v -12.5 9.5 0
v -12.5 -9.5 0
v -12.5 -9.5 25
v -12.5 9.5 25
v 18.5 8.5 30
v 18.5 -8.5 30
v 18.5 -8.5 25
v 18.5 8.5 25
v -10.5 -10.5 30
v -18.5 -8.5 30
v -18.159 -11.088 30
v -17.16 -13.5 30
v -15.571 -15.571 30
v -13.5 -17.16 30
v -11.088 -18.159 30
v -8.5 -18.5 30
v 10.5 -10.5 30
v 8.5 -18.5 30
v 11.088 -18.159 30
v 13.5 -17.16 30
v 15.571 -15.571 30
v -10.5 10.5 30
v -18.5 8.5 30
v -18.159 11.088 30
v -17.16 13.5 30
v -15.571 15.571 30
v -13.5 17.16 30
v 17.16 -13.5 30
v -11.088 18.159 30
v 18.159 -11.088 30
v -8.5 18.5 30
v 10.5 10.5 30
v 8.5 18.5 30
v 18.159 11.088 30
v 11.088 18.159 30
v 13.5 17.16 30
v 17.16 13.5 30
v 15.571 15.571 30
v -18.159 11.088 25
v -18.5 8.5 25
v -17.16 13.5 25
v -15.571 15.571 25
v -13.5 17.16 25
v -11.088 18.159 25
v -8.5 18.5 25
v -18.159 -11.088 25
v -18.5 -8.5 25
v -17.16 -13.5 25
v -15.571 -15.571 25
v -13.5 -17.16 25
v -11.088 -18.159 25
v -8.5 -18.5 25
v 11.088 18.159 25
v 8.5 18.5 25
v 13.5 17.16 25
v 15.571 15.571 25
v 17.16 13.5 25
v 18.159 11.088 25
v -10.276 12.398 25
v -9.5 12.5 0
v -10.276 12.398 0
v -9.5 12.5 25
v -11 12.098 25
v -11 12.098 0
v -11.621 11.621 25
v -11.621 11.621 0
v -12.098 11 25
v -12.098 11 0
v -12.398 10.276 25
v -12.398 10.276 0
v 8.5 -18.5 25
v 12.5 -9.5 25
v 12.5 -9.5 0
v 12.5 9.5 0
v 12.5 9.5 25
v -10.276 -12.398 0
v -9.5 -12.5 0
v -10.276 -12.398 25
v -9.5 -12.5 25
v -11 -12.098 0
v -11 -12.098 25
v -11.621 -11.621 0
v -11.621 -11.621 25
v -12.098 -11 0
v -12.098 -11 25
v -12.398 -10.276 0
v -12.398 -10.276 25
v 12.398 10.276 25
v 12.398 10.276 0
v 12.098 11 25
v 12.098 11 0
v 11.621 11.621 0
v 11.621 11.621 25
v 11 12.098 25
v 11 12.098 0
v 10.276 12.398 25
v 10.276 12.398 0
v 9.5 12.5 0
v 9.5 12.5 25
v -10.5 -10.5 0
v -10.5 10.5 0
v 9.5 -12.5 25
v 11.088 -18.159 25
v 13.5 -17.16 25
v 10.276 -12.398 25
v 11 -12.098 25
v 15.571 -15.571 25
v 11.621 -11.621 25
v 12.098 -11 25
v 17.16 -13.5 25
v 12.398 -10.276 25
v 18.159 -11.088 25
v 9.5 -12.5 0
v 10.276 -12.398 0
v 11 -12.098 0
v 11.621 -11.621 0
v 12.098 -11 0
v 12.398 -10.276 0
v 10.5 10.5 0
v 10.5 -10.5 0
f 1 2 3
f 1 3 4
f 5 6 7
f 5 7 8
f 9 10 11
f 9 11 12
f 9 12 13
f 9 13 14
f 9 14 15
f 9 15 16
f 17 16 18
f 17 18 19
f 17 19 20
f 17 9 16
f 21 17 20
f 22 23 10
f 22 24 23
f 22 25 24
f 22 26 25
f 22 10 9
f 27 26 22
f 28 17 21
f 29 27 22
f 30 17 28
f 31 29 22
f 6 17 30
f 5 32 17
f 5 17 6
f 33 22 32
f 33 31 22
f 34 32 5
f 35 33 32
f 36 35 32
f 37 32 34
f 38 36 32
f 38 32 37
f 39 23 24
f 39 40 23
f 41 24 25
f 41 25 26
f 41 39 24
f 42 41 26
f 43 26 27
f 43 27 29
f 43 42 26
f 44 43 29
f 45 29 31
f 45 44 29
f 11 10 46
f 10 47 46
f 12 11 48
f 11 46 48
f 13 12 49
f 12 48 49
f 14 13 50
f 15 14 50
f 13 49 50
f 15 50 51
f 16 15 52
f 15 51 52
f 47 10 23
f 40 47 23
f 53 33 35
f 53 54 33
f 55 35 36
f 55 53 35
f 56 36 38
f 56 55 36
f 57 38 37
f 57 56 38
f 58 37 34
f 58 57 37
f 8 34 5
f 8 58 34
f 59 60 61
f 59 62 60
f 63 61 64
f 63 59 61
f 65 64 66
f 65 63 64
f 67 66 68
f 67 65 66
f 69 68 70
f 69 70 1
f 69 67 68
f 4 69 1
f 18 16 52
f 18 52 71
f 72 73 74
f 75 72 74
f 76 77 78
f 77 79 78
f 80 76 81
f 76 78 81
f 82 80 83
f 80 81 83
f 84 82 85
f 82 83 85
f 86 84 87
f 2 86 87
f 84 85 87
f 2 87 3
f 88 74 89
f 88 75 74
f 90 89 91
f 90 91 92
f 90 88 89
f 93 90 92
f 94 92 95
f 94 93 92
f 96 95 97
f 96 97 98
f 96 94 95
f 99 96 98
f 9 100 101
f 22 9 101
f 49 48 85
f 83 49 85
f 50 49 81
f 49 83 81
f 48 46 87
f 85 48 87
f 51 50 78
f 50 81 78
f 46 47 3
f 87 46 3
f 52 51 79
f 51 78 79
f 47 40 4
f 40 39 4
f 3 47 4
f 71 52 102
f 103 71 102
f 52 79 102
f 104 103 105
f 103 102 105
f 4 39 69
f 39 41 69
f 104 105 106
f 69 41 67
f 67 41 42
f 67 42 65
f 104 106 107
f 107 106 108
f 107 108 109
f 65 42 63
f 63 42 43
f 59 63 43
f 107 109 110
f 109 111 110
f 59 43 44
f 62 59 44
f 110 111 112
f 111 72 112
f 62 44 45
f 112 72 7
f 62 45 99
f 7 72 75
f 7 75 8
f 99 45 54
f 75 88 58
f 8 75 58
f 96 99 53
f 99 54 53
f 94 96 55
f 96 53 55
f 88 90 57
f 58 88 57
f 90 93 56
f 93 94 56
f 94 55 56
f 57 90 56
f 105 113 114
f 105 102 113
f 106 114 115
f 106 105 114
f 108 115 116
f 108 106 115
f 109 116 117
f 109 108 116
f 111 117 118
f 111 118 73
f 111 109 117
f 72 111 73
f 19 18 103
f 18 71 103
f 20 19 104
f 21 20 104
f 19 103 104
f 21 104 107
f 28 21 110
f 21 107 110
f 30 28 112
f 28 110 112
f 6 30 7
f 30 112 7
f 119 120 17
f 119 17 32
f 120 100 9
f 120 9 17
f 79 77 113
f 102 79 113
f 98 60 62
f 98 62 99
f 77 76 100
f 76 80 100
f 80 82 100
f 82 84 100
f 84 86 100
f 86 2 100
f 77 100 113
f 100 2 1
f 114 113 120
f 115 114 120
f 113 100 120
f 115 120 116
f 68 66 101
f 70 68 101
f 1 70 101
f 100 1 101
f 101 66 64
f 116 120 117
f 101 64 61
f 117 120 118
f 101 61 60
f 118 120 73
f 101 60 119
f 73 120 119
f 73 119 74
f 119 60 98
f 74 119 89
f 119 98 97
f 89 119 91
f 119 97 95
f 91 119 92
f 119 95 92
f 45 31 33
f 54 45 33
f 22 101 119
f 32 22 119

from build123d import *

# Parameters (mm, degrees)
ESQUISSE1_W        = 25
ESQUISSE1_H        = 25
ESQUISSE1_W_2      = 21
ESQUISSE1_H_2      = 21
BOSS_EXTRU_1_DEPTH = 30
ESQUISSE2_W        = 37
ESQUISSE2_H        = 37
ESQUISSE2_W_2      = 25
ESQUISSE2_H_2      = 25
BOSS_EXTRU_2_DEPTH = 5
CONG_1_R           = 10
CONG_2_R           = 3


with BuildPart() as part:
    # Esquisse1 → Boss.-Extru.1 (new body)
    with BuildSketch(Plane.XY):
        Rectangle(ESQUISSE1_W, ESQUISSE1_H)
        Rectangle(ESQUISSE1_W_2, ESQUISSE1_H_2, mode=Mode.SUBTRACT)
    extrude(amount=BOSS_EXTRU_1_DEPTH)

    # Esquisse2 → Boss.-Extru.2 (add)
    with BuildSketch(Plane.XY.offset(30)):
        Rectangle(ESQUISSE2_W, ESQUISSE2_H)
        Rectangle(ESQUISSE2_W_2, ESQUISSE2_H_2, mode=Mode.SUBTRACT)
    extrude(amount=-BOSS_EXTRU_2_DEPTH)

    # Congé1
    cong_1_edges = [part.edges().sort_by_distance(p)[0] for p in [
        (18.5, -18.5, 27.5),
        (-18.5, -18.5, 27.5),
        (-18.5, 18.5, 27.5),
        (18.5, 18.5, 27.5),
    ]]
    fillet(cong_1_edges, radius=CONG_1_R)

    # Congé2
    cong_2_edges = [part.edges().sort_by_distance(p)[0] for p in [
        (12.5, -12.5, 12.5),
        (-12.5, -12.5, 12.5),
        (-12.5, 12.5, 12.5),
        (12.5, 12.5, 12.5),
    ]]
    fillet(cong_2_edges, radius=CONG_2_R)


solid = part.part
